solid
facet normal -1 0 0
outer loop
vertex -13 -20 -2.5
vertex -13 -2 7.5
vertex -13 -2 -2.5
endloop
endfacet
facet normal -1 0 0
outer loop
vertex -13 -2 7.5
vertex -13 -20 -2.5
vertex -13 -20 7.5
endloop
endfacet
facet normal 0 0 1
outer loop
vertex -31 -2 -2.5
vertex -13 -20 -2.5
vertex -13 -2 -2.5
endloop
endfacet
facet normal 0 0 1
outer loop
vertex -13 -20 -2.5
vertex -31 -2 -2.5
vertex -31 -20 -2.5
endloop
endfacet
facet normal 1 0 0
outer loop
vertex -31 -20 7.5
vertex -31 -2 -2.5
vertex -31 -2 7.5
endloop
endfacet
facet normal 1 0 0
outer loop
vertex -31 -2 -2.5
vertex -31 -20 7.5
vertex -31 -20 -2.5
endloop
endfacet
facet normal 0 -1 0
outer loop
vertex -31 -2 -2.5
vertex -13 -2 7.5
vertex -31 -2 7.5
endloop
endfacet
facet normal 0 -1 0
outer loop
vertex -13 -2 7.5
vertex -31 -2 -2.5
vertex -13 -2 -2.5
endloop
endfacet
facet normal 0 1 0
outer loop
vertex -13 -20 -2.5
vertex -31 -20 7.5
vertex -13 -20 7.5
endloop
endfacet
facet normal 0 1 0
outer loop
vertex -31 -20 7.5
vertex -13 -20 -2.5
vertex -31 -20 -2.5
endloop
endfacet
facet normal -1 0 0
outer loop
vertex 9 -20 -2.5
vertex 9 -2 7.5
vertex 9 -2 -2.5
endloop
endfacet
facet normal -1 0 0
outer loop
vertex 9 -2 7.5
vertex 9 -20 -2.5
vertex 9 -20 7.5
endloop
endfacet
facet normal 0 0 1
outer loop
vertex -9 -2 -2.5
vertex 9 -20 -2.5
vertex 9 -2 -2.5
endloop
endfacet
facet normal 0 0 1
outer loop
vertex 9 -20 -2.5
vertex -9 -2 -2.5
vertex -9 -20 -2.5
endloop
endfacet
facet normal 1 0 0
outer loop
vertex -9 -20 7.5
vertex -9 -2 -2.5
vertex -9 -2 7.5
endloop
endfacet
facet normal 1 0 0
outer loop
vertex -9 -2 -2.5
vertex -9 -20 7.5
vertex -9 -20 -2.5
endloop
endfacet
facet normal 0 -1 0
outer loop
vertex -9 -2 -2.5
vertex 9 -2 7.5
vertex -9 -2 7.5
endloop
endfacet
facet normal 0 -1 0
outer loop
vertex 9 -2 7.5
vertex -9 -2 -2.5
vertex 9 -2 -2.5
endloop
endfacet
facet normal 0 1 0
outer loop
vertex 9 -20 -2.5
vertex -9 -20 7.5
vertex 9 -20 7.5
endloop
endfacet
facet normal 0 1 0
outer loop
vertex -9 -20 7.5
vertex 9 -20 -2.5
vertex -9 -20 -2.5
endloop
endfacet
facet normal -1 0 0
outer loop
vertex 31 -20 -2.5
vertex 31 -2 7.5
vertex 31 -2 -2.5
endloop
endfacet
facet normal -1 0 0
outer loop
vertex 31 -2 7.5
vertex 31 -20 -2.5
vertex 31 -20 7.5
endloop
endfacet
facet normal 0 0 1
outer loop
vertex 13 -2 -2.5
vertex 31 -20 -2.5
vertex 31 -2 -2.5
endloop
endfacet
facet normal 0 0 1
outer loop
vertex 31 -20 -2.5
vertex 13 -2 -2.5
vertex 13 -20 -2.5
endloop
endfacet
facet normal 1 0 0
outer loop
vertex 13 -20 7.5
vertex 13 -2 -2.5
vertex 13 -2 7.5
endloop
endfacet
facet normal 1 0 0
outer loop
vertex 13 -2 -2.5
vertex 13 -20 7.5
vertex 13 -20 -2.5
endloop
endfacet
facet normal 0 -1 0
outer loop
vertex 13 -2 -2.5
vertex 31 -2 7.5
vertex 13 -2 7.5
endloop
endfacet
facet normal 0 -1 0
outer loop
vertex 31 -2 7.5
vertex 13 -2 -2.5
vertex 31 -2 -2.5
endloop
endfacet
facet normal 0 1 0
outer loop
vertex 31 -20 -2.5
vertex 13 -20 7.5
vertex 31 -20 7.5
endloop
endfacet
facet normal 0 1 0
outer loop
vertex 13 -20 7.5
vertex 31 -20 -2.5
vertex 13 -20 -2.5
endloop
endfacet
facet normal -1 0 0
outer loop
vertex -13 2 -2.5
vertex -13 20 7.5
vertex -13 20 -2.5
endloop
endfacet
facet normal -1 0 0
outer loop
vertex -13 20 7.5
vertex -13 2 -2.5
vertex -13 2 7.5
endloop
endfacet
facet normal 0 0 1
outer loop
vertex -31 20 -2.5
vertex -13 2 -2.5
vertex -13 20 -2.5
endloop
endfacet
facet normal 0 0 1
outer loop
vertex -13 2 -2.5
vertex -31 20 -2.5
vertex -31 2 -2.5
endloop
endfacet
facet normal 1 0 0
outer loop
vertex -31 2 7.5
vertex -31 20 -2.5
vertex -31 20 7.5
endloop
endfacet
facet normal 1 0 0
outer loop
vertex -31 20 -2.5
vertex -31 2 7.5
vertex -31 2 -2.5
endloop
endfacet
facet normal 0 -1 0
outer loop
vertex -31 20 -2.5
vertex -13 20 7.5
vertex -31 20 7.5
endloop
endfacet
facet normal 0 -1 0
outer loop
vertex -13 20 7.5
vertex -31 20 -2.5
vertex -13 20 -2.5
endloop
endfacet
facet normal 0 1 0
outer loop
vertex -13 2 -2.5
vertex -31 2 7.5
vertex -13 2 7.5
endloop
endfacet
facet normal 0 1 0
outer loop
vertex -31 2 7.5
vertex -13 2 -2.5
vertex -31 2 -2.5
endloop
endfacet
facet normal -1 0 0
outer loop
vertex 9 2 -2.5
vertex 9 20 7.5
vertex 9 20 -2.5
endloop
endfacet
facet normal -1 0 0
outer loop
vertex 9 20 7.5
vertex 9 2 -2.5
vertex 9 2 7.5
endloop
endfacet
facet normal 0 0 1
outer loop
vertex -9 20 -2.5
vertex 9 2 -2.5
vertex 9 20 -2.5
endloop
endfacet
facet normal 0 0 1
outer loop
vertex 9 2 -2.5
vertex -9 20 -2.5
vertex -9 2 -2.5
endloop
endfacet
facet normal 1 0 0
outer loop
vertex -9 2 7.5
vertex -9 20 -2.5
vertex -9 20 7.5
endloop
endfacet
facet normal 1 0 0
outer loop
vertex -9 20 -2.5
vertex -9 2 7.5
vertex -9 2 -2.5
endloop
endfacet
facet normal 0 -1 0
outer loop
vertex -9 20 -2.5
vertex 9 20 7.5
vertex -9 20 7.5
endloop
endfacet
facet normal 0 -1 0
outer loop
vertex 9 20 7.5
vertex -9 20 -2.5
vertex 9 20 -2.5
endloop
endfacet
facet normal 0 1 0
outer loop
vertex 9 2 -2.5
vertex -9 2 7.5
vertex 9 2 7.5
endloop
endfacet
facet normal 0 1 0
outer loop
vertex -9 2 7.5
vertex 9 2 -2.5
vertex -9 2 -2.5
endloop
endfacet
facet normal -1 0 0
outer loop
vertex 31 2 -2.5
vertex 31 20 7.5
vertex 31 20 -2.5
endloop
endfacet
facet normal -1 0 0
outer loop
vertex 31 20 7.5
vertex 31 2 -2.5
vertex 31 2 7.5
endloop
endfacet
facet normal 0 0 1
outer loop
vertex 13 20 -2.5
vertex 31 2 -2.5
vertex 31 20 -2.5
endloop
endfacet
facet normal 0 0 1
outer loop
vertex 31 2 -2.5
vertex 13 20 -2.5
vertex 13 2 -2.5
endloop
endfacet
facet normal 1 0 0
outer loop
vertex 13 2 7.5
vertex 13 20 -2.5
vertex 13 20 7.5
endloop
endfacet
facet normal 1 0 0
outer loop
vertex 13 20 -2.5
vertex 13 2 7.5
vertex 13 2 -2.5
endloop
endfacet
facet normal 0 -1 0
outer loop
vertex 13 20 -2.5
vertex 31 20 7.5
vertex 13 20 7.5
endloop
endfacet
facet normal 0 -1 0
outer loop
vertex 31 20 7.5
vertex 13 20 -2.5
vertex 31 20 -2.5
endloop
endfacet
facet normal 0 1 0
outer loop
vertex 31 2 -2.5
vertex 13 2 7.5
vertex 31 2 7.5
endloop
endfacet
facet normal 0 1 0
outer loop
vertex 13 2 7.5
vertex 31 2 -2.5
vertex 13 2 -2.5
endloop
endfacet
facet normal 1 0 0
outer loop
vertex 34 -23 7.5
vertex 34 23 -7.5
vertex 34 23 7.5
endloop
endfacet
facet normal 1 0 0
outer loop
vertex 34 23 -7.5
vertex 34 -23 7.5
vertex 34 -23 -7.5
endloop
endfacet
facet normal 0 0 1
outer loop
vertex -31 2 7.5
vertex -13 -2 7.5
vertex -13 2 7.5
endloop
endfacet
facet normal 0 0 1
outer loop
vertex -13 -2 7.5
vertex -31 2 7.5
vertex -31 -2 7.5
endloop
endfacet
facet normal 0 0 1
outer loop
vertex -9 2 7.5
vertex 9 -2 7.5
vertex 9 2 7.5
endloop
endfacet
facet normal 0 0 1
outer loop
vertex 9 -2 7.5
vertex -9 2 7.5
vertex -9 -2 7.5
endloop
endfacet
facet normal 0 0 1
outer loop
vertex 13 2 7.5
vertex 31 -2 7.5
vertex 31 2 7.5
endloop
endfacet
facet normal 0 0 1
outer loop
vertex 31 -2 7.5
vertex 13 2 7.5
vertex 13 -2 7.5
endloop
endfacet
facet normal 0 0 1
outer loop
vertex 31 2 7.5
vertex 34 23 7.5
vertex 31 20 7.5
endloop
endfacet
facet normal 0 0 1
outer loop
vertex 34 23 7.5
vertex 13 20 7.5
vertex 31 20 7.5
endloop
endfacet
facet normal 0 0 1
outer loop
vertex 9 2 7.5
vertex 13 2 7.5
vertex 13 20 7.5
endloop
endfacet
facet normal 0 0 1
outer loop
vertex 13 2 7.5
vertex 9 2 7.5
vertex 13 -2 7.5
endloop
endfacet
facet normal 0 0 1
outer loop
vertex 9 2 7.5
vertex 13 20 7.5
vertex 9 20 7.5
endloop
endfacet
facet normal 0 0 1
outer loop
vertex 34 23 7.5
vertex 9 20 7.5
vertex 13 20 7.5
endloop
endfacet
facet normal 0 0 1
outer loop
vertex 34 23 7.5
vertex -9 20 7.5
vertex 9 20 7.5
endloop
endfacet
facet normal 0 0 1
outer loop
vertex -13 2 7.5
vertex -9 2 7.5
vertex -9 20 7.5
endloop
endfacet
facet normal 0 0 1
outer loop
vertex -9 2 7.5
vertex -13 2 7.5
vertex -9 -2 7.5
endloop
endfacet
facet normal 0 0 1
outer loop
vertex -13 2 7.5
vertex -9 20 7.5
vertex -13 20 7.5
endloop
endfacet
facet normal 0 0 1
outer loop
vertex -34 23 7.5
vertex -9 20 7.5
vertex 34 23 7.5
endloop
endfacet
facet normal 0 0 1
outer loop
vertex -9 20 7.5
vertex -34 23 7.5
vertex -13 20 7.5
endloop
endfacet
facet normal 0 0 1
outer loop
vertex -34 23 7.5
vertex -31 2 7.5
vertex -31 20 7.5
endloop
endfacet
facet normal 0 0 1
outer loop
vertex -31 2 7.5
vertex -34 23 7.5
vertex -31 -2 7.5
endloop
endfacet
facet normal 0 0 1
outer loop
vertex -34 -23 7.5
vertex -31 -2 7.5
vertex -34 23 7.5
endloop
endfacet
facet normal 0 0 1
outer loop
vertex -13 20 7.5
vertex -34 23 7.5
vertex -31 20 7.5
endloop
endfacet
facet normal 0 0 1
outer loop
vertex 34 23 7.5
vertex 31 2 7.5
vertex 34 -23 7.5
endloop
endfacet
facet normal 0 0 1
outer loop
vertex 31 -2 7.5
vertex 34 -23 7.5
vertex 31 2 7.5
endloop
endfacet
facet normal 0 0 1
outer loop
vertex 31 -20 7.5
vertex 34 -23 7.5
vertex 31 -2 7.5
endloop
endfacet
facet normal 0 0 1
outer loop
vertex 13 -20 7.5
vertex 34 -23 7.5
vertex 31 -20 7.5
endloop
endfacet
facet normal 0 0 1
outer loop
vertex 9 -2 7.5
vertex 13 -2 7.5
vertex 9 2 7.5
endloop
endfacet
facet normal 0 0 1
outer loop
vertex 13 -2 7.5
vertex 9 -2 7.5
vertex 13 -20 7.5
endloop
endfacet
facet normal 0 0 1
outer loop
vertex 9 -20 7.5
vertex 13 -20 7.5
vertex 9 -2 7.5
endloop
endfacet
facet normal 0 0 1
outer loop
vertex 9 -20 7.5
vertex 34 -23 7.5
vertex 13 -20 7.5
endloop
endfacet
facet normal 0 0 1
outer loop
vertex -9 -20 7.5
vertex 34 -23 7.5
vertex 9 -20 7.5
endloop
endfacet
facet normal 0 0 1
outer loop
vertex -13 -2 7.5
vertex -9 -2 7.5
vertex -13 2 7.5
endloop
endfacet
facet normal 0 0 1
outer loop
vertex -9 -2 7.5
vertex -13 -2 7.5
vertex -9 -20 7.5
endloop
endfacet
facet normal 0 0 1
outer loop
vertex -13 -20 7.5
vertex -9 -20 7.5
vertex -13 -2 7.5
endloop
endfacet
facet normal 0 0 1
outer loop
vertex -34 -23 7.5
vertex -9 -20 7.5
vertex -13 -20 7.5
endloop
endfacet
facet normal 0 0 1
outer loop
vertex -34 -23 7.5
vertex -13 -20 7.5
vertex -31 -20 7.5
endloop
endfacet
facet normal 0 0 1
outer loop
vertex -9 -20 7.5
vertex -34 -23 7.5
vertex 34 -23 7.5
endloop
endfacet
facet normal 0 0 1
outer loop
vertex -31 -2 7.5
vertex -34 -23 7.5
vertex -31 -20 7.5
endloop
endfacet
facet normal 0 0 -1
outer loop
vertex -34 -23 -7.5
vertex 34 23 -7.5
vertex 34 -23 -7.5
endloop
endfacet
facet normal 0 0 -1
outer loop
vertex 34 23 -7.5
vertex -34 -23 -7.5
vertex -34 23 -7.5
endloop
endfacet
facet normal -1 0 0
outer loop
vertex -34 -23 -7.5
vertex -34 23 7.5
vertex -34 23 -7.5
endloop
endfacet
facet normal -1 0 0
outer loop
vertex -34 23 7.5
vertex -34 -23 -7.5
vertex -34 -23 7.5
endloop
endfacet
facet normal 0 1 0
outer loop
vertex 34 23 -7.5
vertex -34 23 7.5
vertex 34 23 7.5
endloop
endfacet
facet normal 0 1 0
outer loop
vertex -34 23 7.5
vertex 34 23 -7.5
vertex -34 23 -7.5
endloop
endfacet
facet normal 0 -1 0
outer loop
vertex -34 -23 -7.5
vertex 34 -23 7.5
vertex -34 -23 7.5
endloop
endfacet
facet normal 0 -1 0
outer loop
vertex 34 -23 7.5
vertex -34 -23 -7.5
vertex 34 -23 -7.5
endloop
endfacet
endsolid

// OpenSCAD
$fn = 32;

// ----------------------------------------------------------------------
// Pocket plate 68 x 46 x 15
// 2 x 3 pockets 18 mm square, 10 mm deep
// ----------------------------------------------------------------------

// --- parameters (mm) ---
thickness = 15;  // plate thickness
floor_t = 5;     // material left under each pocket
pocket = 18;     // pocket side length
pitch_x = 22;    // pocket pitch along X
pitch_y = 22;    // pocket pitch along Y
cols = 3;        // pockets per row
rows = 2;        // rows of pockets

// --- derived feature positions (mm) ---
depth = thickness - floor_t;        // = 10   pocket depth, down to the floor
span_x = (cols - 1) * pitch_x;      // = 44   distance between outer pockets
span_y = (rows - 1) * pitch_y;      // = 22   distance between outer pocket rows
origin_x = -span_x / 2;             // = -22   X of the first pocket
origin_y = -span_y / 2;             // = -11   Y of the first pocket
plate = [span_x + pocket + 6, span_y + pocket + 6, thickness];  // = [68, 46, 15]   overall size: pockets plus 3 mm of wall on each side
feature_centers = [
  [origin_x + 0 * pitch_x, origin_y + 0 * pitch_y],
  [origin_x + 1 * pitch_x, origin_y + 0 * pitch_y],
  [origin_x + 2 * pitch_x, origin_y + 0 * pitch_y],
  [origin_x + 0 * pitch_x, origin_y + 1 * pitch_y],
  [origin_x + 1 * pitch_x, origin_y + 1 * pitch_y],
  [origin_x + 2 * pitch_x, origin_y + 1 * pitch_y]
];   // pocket centres, used verbatim by the cutter loop

// plate outline, then one pocket per centre in feature_centers
difference() {
  cube(plate, center = true);
  for (centre = feature_centers)
    translate([centre[0] - pocket / 2, centre[1] - pocket / 2, plate[2] / 2 - depth])
      cube([pocket, pocket, depth + 1]);  // centred on the declared pocket centre
}
